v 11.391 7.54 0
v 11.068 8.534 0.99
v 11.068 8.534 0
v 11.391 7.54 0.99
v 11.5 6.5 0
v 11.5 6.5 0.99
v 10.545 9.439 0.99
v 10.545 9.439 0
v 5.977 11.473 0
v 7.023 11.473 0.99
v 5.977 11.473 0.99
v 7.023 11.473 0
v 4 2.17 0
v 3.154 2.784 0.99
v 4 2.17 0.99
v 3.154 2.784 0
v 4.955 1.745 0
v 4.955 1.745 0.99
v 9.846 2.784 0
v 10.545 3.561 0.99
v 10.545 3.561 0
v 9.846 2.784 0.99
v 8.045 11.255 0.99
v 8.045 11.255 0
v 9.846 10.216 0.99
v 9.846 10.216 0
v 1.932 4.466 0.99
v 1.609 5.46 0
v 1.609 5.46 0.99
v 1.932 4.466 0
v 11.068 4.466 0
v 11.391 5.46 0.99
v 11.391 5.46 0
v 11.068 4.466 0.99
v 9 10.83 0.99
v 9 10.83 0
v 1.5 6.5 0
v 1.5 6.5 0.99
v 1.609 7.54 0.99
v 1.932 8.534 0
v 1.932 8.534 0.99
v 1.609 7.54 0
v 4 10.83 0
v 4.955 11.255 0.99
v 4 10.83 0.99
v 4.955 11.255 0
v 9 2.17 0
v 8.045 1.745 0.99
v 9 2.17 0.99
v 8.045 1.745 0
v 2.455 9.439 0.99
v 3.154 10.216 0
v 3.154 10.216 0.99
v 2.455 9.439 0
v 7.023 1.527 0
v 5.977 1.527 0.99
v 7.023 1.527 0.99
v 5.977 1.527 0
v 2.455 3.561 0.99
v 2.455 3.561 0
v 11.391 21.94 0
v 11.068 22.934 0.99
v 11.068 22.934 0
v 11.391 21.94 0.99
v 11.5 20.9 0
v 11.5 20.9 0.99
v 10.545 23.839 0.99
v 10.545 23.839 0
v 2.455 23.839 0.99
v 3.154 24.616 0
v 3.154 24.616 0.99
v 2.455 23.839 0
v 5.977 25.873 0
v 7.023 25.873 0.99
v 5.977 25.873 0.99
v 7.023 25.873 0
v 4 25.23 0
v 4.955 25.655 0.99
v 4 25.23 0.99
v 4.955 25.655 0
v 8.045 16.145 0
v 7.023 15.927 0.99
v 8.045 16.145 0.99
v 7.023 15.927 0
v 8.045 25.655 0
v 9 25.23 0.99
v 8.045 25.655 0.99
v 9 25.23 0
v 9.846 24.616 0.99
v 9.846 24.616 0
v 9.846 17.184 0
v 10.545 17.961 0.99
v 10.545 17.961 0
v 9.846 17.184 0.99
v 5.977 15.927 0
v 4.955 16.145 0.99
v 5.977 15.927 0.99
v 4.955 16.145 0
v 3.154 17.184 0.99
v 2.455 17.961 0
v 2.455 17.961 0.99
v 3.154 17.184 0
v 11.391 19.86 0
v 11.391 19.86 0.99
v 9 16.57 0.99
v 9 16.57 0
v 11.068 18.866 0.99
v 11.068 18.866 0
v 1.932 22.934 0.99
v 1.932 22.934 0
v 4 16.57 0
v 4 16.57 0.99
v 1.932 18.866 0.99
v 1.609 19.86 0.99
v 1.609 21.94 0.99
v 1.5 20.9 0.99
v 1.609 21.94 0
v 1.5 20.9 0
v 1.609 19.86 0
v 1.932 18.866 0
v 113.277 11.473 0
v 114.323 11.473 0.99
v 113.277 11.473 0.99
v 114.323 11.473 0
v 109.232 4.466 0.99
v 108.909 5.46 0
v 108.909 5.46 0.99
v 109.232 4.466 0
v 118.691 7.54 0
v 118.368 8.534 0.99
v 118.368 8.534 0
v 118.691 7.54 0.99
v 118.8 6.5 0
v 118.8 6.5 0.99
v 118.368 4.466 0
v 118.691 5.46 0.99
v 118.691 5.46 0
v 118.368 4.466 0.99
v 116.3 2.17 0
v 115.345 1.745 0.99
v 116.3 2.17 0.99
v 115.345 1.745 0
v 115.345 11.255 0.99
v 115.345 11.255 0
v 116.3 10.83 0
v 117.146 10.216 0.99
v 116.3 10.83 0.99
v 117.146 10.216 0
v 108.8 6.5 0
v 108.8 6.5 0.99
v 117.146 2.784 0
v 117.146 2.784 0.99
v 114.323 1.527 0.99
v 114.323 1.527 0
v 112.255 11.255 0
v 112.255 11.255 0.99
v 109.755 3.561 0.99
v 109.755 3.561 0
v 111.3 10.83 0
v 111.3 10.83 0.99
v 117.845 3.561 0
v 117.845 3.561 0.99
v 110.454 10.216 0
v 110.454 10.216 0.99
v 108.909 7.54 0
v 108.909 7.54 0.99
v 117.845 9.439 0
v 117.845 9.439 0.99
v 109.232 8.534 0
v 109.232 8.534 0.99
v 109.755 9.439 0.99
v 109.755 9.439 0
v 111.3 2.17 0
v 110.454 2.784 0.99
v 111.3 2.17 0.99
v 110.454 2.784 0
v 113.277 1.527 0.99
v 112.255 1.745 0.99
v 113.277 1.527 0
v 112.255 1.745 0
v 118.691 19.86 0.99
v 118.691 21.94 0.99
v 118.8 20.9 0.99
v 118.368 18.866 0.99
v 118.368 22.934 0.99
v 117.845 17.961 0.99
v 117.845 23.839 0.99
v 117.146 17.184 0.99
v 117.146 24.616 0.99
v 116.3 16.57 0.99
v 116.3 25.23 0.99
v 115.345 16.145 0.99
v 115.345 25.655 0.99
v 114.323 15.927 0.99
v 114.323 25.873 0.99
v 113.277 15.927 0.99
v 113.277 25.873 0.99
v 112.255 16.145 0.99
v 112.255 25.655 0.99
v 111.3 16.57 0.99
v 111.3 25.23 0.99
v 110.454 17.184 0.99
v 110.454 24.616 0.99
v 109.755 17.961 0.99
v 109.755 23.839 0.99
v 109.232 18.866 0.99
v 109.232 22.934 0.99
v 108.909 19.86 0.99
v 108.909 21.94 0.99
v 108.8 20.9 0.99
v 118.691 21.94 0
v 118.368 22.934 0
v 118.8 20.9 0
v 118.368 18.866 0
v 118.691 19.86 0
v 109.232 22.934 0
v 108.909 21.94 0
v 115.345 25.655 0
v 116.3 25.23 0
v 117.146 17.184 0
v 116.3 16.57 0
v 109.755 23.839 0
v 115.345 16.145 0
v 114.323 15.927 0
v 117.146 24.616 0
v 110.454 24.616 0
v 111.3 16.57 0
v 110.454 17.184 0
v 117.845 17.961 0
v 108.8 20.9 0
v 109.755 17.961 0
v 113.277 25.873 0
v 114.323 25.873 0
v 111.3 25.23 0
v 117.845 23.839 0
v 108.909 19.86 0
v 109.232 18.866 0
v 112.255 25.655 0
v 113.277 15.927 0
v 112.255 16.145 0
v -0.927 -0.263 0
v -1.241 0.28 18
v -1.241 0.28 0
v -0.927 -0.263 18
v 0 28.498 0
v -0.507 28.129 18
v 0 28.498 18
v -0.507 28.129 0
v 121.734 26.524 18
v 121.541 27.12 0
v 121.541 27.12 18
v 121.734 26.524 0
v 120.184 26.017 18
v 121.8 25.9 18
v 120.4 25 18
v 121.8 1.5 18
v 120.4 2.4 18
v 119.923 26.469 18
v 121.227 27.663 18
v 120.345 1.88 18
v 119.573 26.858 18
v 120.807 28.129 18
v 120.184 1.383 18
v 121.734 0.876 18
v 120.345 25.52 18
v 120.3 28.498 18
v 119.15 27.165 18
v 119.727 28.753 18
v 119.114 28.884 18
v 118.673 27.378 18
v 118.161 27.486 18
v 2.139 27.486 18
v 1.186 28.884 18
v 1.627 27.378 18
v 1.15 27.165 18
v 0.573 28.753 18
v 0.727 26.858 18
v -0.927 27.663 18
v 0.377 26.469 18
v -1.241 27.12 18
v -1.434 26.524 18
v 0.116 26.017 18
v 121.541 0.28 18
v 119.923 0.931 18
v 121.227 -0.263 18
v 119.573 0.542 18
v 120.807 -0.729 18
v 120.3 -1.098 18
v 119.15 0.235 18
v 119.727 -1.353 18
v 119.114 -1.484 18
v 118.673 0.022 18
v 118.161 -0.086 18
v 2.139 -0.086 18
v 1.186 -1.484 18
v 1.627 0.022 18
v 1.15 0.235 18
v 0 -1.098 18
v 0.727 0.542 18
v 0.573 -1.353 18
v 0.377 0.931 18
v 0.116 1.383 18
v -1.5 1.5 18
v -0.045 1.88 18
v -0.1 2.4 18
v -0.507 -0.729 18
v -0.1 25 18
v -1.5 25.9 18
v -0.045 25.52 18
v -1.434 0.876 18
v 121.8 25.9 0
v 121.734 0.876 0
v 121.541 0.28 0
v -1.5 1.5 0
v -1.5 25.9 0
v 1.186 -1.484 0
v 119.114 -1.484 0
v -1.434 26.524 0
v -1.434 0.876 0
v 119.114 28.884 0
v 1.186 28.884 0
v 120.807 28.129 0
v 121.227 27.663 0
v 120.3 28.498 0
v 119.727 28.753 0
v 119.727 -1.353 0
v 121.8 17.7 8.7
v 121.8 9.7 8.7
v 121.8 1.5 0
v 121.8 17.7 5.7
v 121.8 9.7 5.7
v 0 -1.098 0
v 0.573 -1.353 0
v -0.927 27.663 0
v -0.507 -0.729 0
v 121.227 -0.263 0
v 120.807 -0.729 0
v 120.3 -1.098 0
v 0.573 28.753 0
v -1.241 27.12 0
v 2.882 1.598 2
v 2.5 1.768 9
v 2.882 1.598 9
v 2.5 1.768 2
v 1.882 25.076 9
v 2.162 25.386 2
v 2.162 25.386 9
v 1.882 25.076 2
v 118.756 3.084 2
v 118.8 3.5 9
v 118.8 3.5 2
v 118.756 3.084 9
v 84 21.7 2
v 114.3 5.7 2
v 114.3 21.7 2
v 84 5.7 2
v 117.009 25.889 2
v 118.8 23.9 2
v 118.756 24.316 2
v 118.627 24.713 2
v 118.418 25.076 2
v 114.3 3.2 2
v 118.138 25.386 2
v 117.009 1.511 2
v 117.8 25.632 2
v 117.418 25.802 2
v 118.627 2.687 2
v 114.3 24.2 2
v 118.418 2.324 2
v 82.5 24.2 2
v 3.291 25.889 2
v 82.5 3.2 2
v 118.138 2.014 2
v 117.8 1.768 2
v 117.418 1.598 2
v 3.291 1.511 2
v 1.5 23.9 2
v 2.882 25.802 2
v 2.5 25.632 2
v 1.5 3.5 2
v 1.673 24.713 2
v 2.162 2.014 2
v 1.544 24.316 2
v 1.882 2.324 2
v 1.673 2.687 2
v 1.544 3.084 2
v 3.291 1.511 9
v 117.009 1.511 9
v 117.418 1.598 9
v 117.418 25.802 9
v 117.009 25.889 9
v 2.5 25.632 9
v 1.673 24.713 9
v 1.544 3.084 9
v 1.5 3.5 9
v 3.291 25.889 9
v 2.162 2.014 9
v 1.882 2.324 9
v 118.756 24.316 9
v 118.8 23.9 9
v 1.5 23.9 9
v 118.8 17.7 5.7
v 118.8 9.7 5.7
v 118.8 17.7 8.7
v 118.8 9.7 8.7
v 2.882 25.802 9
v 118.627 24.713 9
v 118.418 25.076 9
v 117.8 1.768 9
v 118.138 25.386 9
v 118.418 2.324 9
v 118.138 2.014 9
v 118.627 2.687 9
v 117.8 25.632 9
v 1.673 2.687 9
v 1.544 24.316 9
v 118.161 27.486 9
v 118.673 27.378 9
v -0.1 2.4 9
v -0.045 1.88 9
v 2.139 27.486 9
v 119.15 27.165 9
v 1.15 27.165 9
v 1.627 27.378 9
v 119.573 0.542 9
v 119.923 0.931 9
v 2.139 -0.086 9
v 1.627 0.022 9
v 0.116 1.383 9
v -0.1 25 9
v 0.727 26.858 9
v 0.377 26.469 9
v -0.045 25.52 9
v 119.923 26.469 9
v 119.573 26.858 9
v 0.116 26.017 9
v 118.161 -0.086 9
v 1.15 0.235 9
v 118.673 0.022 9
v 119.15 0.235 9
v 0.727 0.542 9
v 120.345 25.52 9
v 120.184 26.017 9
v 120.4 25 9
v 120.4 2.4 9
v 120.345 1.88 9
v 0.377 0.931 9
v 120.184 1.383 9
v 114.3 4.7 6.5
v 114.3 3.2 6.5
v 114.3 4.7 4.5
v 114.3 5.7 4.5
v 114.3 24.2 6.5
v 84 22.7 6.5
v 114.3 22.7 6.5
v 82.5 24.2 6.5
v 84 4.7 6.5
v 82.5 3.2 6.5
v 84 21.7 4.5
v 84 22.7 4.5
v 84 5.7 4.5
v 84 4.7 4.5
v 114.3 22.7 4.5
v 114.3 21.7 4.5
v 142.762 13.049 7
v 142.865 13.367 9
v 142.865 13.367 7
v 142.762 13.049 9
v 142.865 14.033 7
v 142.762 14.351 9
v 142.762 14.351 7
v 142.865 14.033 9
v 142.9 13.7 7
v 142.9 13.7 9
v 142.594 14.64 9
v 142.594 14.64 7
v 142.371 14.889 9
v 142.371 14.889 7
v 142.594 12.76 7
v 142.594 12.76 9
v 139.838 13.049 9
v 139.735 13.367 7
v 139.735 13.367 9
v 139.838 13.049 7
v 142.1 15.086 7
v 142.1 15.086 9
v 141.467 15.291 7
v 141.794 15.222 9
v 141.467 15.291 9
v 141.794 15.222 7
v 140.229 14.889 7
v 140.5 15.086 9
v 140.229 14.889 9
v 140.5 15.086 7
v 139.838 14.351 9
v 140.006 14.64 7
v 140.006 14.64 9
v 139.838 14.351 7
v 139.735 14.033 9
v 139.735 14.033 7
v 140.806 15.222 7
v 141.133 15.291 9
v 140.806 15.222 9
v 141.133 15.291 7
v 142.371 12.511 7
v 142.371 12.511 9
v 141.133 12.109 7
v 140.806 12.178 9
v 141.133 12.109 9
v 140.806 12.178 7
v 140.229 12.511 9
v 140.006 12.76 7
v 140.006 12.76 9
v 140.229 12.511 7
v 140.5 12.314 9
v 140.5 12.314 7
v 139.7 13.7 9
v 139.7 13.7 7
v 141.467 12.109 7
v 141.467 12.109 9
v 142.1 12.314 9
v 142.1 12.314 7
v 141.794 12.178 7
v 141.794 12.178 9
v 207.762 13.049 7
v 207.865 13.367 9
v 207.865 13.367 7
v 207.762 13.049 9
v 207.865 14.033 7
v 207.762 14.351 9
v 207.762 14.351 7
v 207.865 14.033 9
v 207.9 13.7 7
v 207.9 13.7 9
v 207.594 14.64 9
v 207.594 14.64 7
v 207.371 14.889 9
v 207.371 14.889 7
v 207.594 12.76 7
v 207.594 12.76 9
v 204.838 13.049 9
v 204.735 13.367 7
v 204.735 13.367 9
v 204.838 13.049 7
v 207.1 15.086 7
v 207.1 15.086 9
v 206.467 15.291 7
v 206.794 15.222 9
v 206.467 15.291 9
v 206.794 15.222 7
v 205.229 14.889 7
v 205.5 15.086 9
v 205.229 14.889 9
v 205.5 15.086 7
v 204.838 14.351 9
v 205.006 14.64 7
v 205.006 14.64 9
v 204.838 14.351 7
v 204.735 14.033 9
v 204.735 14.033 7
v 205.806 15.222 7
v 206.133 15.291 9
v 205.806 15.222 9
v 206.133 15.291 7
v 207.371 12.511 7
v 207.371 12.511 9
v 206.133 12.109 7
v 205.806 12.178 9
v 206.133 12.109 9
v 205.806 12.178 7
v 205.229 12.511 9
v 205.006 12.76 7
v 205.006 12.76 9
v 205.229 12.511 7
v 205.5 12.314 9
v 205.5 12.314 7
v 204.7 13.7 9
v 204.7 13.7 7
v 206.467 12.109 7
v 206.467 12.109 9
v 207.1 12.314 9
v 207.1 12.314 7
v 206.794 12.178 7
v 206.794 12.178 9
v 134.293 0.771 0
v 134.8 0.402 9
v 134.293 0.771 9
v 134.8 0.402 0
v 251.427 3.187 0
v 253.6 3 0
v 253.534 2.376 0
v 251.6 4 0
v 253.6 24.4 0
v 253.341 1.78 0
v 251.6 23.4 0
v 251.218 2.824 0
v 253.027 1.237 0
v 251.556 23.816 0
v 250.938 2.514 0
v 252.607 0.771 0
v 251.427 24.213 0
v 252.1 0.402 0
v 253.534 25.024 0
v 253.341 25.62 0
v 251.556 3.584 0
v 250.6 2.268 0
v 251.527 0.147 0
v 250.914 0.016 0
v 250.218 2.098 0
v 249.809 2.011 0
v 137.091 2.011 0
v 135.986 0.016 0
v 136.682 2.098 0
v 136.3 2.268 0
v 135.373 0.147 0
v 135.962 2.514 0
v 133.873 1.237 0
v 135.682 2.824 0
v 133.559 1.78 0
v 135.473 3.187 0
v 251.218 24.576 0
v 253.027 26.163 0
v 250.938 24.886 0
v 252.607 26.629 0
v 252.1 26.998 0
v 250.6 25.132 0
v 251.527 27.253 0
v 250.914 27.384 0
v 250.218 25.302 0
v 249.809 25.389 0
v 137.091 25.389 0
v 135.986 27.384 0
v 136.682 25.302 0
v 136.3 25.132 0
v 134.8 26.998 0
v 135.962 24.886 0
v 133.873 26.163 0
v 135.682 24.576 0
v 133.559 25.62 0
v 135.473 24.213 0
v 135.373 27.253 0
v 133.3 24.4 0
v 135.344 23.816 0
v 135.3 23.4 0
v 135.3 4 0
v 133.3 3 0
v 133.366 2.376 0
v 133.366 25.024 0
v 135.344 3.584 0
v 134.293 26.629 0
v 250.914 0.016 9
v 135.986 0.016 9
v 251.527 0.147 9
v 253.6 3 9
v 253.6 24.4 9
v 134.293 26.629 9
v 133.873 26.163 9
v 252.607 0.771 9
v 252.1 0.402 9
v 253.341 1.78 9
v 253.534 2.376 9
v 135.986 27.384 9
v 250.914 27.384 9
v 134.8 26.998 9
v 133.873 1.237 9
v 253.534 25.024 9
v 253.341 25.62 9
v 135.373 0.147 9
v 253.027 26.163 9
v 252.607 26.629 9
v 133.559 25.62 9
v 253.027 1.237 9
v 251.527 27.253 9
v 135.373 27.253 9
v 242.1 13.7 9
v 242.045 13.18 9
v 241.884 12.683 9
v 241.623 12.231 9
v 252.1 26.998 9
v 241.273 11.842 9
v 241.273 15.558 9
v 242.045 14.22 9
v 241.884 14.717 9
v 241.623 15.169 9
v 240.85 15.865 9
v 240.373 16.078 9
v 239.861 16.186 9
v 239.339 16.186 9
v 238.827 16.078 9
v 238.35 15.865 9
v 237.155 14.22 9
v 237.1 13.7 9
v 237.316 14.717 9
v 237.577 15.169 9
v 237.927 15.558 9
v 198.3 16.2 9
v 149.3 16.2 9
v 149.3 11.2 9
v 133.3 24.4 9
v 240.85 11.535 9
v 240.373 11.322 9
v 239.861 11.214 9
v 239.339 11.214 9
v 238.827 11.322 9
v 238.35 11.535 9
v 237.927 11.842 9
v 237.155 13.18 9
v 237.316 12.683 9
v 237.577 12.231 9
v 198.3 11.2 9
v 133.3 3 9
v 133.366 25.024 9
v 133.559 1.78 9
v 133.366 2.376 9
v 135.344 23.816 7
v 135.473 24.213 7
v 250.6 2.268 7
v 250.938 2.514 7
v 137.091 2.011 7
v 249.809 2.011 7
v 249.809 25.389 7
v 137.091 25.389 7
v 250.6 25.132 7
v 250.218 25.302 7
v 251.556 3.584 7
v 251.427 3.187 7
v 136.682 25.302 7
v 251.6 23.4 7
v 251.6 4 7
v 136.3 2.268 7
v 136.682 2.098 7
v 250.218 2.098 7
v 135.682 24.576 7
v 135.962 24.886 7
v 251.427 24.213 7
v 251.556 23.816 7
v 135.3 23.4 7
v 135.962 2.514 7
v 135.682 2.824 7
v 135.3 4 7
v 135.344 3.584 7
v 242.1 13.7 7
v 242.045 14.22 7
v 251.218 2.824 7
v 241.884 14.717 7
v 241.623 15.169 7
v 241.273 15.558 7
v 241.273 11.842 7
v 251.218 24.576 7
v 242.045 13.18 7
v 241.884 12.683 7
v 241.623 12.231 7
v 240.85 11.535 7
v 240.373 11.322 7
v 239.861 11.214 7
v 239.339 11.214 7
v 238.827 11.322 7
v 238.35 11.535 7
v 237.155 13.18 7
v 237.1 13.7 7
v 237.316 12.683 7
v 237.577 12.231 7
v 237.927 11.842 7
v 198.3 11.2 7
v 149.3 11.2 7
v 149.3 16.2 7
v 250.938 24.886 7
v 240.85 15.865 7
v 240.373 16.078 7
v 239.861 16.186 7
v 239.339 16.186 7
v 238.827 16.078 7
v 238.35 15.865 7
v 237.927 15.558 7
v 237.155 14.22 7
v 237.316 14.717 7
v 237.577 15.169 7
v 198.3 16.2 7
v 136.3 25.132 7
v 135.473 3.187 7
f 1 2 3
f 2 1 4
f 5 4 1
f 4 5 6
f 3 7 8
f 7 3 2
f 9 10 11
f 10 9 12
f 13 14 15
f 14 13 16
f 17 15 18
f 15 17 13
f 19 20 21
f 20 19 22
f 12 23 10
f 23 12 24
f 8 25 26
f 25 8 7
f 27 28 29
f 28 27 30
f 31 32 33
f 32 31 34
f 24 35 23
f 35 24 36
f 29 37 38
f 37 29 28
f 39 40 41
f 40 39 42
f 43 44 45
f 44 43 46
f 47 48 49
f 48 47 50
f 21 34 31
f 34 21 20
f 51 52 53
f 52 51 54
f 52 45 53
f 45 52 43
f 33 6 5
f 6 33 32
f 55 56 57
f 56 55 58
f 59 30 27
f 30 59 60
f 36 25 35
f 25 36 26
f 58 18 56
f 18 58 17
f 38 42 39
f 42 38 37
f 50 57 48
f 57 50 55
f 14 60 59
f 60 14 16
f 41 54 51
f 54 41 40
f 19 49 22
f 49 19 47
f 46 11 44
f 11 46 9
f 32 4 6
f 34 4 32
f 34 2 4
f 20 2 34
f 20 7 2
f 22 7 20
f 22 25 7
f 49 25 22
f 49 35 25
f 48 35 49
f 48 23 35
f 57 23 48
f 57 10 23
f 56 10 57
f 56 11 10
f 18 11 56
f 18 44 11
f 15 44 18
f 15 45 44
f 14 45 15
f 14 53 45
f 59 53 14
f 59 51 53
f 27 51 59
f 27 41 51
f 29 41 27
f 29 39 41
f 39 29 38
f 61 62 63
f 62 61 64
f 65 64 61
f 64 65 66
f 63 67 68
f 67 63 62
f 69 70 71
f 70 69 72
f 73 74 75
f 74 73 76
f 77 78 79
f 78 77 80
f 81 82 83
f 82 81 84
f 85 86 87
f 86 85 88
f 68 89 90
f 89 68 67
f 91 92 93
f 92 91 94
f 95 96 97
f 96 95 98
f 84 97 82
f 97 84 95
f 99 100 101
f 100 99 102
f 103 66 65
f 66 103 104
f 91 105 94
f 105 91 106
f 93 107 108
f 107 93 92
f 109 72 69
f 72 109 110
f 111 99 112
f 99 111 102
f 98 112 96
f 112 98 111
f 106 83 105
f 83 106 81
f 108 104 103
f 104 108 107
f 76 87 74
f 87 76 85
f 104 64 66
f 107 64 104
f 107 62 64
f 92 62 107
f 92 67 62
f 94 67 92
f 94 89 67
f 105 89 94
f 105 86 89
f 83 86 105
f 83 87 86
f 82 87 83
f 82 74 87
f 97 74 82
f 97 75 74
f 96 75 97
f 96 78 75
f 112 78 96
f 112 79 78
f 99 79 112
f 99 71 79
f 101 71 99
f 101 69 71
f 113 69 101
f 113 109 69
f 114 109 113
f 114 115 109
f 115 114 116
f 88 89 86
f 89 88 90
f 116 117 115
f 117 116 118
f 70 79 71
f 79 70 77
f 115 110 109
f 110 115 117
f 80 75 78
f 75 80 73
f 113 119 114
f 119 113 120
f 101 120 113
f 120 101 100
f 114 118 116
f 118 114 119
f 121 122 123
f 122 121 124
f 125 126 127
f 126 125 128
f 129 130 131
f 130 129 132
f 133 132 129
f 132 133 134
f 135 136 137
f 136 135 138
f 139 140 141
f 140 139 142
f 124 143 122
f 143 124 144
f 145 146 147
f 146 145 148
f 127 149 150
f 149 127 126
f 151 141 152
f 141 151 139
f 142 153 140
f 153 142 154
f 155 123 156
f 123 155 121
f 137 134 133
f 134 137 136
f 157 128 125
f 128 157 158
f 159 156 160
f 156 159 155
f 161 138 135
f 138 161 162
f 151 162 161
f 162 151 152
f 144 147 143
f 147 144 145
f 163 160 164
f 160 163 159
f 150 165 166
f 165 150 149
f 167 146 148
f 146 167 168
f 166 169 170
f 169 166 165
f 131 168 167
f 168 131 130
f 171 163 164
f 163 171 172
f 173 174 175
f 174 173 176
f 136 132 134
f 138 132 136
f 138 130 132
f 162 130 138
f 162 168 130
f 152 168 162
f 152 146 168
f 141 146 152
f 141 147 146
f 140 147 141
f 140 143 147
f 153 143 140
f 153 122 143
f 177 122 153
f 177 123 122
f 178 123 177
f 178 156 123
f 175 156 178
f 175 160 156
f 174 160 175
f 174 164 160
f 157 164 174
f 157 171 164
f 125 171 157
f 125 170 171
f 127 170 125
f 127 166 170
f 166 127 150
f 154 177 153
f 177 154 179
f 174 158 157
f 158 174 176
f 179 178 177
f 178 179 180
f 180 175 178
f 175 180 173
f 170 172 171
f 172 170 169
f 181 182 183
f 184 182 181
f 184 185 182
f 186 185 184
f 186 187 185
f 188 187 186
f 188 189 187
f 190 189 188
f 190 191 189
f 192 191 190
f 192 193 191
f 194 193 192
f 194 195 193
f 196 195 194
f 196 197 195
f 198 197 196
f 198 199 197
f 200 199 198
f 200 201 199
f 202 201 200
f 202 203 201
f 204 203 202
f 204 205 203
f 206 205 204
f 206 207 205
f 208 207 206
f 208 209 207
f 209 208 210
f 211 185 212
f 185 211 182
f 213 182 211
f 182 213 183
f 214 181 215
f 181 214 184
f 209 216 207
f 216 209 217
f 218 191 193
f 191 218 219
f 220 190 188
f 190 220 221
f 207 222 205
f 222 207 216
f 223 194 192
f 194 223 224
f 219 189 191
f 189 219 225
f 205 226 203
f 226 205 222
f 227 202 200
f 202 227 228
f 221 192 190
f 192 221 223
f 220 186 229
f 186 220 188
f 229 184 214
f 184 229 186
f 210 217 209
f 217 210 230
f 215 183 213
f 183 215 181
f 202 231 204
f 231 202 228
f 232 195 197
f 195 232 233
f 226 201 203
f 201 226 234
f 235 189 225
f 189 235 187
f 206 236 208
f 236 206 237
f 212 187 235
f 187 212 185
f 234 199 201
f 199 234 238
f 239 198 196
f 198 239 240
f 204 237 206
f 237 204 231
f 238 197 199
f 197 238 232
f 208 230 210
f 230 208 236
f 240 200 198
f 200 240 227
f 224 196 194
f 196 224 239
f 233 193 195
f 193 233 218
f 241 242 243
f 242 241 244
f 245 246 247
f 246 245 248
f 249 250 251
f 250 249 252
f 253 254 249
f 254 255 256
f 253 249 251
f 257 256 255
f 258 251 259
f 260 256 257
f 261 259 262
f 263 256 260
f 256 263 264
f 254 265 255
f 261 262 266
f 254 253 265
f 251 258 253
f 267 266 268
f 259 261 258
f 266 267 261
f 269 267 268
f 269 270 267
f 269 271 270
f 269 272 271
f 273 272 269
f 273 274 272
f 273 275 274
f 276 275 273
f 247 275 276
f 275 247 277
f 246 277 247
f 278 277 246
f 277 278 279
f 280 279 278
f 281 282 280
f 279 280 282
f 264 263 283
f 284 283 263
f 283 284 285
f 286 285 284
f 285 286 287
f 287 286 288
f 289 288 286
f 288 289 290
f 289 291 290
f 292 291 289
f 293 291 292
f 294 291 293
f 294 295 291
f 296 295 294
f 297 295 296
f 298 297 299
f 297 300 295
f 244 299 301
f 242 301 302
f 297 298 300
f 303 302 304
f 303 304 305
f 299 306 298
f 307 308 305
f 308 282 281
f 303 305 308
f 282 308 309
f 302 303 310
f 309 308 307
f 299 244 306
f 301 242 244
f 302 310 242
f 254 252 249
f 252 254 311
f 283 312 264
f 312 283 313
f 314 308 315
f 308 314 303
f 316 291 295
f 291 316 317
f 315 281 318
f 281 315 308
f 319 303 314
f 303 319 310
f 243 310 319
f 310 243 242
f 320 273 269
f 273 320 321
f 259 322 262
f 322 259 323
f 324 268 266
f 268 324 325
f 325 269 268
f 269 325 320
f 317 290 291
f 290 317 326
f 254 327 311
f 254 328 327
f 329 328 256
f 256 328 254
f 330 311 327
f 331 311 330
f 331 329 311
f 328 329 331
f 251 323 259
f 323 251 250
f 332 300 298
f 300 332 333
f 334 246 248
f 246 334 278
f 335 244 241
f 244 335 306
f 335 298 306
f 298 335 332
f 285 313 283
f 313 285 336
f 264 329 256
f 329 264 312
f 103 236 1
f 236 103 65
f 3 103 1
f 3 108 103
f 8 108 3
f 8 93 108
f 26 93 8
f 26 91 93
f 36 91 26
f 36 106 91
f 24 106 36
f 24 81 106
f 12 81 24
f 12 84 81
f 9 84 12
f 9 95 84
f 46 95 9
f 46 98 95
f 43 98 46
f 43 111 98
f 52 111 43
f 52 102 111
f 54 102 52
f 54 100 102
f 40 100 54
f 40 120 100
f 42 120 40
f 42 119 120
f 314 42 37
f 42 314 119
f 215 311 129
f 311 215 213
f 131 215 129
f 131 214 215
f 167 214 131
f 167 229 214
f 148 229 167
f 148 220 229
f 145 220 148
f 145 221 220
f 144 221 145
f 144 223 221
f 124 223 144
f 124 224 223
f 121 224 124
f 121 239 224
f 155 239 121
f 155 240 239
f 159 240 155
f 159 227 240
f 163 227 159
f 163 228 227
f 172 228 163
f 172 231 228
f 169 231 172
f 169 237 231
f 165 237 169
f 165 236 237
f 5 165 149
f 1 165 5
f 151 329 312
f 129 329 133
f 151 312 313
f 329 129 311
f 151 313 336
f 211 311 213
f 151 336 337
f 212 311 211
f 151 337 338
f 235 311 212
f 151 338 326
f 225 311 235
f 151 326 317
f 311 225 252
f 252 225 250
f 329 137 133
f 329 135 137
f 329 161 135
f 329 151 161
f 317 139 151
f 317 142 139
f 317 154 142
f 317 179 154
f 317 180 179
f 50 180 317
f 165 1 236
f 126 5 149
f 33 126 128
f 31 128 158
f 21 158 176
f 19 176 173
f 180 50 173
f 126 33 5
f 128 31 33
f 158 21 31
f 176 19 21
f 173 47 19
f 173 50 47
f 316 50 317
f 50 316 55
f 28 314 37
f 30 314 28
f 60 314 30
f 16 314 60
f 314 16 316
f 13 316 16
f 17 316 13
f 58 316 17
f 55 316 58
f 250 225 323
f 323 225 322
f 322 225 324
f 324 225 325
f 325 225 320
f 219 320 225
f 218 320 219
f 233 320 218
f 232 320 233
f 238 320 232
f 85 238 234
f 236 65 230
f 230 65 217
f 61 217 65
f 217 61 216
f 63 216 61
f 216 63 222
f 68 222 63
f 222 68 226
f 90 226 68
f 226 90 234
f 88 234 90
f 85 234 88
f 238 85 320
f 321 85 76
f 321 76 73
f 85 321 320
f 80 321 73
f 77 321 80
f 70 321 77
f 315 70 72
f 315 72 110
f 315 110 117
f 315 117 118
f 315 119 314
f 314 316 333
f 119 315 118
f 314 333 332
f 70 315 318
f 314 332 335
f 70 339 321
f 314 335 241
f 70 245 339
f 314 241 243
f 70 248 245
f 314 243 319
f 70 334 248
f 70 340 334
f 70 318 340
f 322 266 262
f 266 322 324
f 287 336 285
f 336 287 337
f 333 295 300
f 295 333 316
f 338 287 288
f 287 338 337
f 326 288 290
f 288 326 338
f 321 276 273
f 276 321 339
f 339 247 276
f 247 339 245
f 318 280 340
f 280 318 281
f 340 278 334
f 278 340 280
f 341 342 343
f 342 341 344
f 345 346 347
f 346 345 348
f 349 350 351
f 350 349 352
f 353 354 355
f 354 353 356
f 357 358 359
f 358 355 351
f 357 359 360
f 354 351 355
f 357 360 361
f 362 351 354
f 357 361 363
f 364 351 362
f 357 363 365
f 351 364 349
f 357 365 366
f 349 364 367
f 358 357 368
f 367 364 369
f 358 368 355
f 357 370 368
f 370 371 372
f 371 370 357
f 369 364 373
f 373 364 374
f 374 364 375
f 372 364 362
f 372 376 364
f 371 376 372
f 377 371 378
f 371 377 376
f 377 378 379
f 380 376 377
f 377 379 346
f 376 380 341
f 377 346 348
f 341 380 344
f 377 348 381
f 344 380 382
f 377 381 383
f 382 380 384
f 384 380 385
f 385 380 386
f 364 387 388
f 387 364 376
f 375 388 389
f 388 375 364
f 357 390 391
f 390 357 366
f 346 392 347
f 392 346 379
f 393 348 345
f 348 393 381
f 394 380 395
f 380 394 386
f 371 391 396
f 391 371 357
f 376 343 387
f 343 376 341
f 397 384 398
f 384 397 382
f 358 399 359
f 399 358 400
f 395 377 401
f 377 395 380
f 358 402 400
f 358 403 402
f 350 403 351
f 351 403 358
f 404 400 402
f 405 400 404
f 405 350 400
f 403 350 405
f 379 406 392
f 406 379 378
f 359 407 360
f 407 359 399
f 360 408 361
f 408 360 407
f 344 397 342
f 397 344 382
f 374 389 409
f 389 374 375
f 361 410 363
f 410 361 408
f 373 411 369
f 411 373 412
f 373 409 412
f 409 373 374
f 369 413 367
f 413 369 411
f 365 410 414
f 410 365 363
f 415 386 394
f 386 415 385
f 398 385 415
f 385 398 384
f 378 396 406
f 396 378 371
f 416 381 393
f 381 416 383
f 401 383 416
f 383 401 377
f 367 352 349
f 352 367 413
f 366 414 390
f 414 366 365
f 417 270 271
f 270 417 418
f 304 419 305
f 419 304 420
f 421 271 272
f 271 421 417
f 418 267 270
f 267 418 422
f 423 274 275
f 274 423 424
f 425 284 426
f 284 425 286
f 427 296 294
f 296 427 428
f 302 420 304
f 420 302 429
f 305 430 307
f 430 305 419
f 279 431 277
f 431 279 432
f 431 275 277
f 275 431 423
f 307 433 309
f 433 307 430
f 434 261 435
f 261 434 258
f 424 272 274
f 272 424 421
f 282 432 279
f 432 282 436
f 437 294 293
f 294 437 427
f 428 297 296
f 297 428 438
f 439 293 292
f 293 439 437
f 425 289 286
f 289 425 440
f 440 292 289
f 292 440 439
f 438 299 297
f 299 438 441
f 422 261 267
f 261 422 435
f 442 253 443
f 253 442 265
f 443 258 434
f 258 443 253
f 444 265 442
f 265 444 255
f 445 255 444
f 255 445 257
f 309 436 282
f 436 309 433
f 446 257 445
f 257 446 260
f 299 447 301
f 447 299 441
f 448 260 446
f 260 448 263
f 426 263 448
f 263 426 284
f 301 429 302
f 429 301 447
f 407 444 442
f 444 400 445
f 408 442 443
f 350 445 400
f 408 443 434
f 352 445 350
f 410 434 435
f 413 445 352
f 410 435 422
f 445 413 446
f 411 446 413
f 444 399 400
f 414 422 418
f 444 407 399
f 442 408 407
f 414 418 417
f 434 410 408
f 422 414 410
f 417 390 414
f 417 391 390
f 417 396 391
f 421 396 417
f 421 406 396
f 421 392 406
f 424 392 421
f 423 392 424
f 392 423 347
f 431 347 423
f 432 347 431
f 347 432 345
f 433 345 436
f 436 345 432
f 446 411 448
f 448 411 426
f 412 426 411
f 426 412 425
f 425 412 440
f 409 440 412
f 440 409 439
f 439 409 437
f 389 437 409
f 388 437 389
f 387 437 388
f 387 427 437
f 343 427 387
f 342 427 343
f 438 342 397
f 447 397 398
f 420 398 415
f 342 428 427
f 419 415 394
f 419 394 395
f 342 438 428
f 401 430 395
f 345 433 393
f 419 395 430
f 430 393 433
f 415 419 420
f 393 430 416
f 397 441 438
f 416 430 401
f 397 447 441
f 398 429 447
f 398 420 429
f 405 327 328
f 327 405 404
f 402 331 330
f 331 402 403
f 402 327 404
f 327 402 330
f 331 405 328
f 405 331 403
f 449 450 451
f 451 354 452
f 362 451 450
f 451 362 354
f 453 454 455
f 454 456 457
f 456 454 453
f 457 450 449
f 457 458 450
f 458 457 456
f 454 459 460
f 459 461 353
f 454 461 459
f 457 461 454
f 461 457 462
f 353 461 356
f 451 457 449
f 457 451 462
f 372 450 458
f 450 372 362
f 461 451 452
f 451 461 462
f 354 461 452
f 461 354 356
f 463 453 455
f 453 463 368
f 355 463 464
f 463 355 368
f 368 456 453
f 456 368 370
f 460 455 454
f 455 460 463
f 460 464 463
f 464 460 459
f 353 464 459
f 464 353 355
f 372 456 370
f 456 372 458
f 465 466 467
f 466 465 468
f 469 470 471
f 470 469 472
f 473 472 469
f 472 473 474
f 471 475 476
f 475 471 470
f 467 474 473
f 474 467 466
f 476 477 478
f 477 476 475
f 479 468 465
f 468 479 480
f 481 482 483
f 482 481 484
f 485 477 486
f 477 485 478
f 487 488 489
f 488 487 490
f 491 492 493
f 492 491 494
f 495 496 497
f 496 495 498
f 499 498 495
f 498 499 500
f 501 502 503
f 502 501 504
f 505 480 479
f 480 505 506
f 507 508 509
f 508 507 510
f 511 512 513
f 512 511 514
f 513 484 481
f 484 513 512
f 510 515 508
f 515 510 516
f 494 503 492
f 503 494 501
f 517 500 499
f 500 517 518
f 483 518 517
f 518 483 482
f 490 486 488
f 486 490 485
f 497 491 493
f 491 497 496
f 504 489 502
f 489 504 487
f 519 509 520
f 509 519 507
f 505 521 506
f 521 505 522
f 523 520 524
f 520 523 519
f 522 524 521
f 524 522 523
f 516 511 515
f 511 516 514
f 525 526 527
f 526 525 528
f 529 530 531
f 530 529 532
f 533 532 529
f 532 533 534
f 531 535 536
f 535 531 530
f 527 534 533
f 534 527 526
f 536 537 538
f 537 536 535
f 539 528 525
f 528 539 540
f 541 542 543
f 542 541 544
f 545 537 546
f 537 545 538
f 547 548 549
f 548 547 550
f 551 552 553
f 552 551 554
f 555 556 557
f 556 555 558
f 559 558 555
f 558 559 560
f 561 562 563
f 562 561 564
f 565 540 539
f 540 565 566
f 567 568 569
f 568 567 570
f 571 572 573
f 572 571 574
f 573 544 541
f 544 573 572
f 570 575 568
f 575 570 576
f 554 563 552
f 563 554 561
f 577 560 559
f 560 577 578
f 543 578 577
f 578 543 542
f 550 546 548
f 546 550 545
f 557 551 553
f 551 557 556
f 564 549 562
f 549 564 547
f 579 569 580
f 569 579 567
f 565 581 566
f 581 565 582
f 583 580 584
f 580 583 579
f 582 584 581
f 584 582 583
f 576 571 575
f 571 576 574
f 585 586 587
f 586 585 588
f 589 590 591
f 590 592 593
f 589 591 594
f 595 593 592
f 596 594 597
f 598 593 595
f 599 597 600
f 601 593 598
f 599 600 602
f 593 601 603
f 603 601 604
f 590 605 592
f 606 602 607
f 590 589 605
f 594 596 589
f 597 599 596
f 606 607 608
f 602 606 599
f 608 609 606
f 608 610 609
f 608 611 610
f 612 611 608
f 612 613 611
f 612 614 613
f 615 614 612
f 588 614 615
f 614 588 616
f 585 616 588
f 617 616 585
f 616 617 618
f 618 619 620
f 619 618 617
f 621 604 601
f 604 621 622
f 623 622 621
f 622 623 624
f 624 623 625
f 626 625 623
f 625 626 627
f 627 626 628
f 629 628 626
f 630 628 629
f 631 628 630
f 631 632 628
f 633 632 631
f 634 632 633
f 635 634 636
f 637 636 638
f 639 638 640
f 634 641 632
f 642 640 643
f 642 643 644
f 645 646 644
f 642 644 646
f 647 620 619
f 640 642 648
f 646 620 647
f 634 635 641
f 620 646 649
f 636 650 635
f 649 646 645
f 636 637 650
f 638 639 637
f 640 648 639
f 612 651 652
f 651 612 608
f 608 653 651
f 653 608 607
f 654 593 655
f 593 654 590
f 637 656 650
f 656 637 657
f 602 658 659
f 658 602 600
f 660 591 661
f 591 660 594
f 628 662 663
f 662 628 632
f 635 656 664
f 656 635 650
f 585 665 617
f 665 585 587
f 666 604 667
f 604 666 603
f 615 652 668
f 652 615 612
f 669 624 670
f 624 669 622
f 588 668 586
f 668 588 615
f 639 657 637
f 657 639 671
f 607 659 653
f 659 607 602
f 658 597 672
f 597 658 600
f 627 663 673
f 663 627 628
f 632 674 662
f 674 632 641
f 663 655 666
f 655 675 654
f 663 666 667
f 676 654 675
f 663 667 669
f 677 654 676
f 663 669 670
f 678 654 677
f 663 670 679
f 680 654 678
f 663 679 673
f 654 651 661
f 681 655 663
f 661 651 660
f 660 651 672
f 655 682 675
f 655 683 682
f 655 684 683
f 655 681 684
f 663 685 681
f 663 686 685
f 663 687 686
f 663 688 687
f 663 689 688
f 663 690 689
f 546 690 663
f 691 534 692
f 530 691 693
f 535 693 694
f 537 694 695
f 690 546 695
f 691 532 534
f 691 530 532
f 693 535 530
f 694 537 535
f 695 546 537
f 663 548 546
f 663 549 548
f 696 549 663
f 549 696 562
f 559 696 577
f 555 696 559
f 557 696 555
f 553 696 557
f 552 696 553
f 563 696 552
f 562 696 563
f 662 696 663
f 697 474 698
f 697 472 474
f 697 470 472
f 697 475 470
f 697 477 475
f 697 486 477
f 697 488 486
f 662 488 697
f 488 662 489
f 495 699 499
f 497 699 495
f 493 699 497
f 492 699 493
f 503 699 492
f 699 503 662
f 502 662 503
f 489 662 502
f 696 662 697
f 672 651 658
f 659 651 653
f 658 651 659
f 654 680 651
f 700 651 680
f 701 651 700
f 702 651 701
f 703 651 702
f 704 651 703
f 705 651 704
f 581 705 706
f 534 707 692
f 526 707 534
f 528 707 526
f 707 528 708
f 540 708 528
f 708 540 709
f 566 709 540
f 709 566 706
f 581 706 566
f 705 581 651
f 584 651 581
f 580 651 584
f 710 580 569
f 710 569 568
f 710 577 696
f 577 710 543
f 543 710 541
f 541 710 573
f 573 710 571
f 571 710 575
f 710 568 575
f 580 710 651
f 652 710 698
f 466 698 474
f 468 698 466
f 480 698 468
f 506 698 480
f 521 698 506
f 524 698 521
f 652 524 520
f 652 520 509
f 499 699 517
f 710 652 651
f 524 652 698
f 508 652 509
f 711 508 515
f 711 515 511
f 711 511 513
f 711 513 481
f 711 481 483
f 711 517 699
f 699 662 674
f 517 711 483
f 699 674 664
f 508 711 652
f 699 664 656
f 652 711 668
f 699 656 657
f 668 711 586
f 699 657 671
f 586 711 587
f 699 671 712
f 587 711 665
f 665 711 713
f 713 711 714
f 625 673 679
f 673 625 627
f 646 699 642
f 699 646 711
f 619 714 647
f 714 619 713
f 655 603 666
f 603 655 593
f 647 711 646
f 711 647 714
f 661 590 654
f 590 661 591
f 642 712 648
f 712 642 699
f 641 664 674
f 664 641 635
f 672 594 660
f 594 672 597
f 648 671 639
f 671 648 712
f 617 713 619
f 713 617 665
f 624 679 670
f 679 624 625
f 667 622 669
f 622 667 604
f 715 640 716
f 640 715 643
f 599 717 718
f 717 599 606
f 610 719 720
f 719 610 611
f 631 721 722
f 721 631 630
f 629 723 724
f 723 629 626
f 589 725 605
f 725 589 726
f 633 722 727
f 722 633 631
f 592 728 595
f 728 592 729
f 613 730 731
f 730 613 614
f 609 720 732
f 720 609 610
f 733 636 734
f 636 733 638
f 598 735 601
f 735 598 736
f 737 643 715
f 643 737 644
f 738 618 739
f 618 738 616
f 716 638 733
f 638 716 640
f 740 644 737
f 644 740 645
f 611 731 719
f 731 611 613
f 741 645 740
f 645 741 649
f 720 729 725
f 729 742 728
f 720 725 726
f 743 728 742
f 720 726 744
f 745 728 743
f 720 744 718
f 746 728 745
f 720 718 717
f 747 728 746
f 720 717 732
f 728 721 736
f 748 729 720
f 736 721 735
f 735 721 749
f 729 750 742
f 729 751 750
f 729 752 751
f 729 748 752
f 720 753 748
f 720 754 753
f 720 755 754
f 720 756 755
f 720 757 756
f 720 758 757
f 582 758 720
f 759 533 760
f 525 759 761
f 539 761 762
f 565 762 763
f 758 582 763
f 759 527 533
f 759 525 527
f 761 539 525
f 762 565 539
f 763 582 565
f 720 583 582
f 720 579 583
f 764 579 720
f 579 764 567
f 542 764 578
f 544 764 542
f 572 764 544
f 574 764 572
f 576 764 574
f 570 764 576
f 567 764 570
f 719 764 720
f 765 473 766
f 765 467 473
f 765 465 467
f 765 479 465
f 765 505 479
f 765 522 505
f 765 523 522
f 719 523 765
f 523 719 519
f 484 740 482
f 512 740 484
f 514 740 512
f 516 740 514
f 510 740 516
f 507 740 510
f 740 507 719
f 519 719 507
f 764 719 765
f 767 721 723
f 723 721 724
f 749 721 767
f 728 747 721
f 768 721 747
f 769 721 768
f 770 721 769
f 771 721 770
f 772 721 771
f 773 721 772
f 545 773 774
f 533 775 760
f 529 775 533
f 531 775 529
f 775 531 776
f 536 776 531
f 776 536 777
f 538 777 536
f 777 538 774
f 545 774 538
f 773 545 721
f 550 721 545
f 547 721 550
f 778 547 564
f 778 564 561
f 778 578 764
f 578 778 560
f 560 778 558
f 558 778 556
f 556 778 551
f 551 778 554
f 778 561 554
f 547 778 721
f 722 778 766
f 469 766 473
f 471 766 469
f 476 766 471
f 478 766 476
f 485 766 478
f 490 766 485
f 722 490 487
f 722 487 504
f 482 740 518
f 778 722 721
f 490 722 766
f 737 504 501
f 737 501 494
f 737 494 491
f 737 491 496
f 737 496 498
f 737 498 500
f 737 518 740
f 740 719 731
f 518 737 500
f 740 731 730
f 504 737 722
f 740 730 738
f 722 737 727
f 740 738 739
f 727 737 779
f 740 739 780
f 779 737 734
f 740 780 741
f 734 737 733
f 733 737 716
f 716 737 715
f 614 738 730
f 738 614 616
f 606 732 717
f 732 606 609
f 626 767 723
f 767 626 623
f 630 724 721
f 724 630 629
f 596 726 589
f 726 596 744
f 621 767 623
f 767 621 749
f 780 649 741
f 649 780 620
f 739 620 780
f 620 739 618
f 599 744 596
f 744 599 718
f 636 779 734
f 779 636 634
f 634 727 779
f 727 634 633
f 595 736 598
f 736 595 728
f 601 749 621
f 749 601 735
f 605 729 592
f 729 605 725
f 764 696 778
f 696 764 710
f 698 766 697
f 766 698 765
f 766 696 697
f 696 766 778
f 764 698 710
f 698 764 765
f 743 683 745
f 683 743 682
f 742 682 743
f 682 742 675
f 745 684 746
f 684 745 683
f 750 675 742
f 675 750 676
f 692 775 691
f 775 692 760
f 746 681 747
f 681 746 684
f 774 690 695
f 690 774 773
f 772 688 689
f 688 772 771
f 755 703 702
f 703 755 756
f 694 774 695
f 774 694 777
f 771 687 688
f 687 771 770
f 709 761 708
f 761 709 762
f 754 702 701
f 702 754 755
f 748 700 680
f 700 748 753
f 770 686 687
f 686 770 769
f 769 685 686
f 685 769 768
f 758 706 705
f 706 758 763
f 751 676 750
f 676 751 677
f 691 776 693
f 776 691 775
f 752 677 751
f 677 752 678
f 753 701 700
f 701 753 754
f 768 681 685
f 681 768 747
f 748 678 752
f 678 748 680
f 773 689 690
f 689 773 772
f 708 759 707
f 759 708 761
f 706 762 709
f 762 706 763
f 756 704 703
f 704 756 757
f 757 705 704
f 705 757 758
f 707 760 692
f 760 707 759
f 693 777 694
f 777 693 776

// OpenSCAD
// USB MIDI Crossfader — Enclosure
// Two-piece snap-fit case for Mini Innofader Plus + Teensy 4.0
// Print both pieces flat (no supports needed).
//
// Units: mm

// --- Dimensions (adjust to match your specific Innofader Plus) ---
fader_slot_length = 49;       // fader knob travel opening
fader_slot_width  = 5;        // width of the slot for the knob
fader_mount_spacing = 65;     // screw hole center-to-center (~1.5")
fader_mount_hole_dia = 3.2;   // M3 screw clearance
fader_body_length = 73;       // fader PCB length (along travel axis)
fader_body_width  = 16;       // fader PCB width

// Teensy 4.0 dimensions (without pins — soldering wires directly)
teensy_length = 36.3;
teensy_width  = 17.4;
teensy_height = 4;            // no pins, board + components only
usb_width     = 8;            // micro-USB port opening
usb_height    = 3.0;            // micro-USB port height

// Teensy cradle parameters
teensy_cradle_tolerance = 0.3;      // gap per side for friction fit
teensy_ledge_height = 2.5;          // height of ledge where PCB rests (SMD clearance below)
teensy_rail_total_height = 4.5;     // total rail height (extends above ledge to grip board)
teensy_rail_thickness = 1.5;        // outer rail wall thickness
teensy_ledge_width = 1.0;           // inward lip width that supports PCB edges
teensy_backstop_thickness = 1.5;    // end stop wall thickness

// Case parameters
wall = 2;
case_length = fader_body_length + teensy_length + wall * 3 + 5; // fader + gap + teensy
case_width  = max(fader_body_width, teensy_width) + wall * 2 + 6;
case_height = 18;             // raised for component clearance
corner_r    = 3;
fit_gap     = 3.0;            // base larger than top plate (1.5mm per side)
lid_clearance = 0.2;          // clearance around lid in rebate (0.1mm per side)
lower_wall = wall + 1.0;      // thicker walls below rebate to create wider ledge (3mm)

// Teensy area position (shared between base and top_plate)
teensy_area_start = wall + 2 + fader_body_length + wall + 5;

// LED hole (for WS2812B — light pipe or flush mount)
led_hole_dia = 5;

// Rubber foot recesses
foot_dia    = 10;
foot_depth  = 1;
foot_inset  = 8; // from corner

// --- Modules ---

module rounded_box(l, w, h, r) {
    hull() {
        for (x = [r, l-r])
            for (y = [r, w-r])
                translate([x, y, 0])
                    cylinder(h=h, r=r, $fn=30);
    }
}

// (snap-fit removed — lid friction-fits into rebate)

// --- Base (full-height box with rebate for lid) ---
module base() {
    off = fit_gap / 2;  // base extends this far beyond top plate on each side
    base_length = case_length + fit_gap;
    base_width  = case_width + fit_gap;

    difference() {
        // Outer shell — full case height
        translate([-off, -off, 0])
            rounded_box(base_length, base_width, case_height, corner_r);

        // Lower cavity (component area — thicker walls for ledge)
        translate([-off + lower_wall, -off + lower_wall, wall])
            rounded_box(base_length - lower_wall*2, base_width - lower_wall*2,
                        case_height, corner_r - 1);

        // Upper rebate (lid drops in here — thinner rim walls)
        translate([-lid_clearance/2, -lid_clearance/2, case_height / 2])
            rounded_box(case_length + lid_clearance, case_width + lid_clearance,
                        case_height, corner_r - 0.5);

        // USB port cutout (through base back wall — aligned to Teensy on ledge)
        usb_z = wall + teensy_ledge_height + 1.2;
        translate([case_length - wall - 1,
                   case_width/2 - usb_width/2,
                   usb_z])
            cube([wall + off + 2, usb_width, usb_height]);

        // Rubber foot recesses (bottom, centered on base)
        for (x = [foot_inset - off, base_length - foot_inset - off])
            for (y = [foot_inset - off, base_width - foot_inset - off])
                translate([x, y, -0.01])
                    cylinder(d=foot_dia, h=foot_depth, $fn=30);
    }

    // Teensy cradle — L-shaped rails with ledges, open underneath for SMDs
    teensy_cavity_width = teensy_width + teensy_cradle_tolerance * 2;
    teensy_center_y = case_width / 2;
    teensy_rail_y_left  = teensy_center_y - teensy_cavity_width / 2 - teensy_rail_thickness;
    teensy_rail_y_right = teensy_center_y + teensy_cavity_width / 2;
    teensy_rail_len = teensy_length - 6;  // shortened on USB end for clearance

    // Left rail wall (full height)
    translate([teensy_area_start, teensy_rail_y_left, wall])
        cube([teensy_rail_len, teensy_rail_thickness, teensy_rail_total_height]);

    // Left rail ledge (inward lip — PCB edge rests here)
    translate([teensy_area_start, teensy_rail_y_left + teensy_rail_thickness, wall])
        cube([teensy_rail_len, teensy_ledge_width, teensy_ledge_height]);

    // Right rail wall (full height)
    translate([teensy_area_start, teensy_rail_y_right, wall])
        cube([teensy_rail_len, teensy_rail_thickness, teensy_rail_total_height]);

    // Right rail ledge (inward lip — PCB edge rests here)
    translate([teensy_area_start, teensy_rail_y_right - teensy_ledge_width, wall])
        cube([teensy_rail_len, teensy_ledge_width, teensy_ledge_height]);

    // Backstop (non-USB end, prevents sliding toward fader)
    translate([teensy_area_start - teensy_backstop_thickness,
               teensy_rail_y_left,
               wall])
        cube([teensy_backstop_thickness,
              teensy_cavity_width + teensy_rail_thickness * 2,
              teensy_rail_total_height]);
}

// --- Top plate (lid — drops into base rebate) ---
module top_plate() {
    fader_area_start = wall + 2;

    difference() {
        // Lid outer shell
        rounded_box(case_length, case_width, case_height / 2, corner_r);

        // Hollow out underside (fader body hangs down into this cavity)
        translate([wall, wall, -0.01])
            rounded_box(case_length - wall*2, case_width - wall*2,
                        case_height / 2 - wall + 0.01, corner_r - 1);

        // Fader slot (knob travel)
        translate([fader_area_start + (fader_body_length - fader_slot_length) / 2,
                   case_width/2 - fader_slot_width/2,
                   -0.5])
            cube([fader_slot_length, fader_slot_width, case_height]);

        // Fader mounting holes (M3 clearance through 2mm ceiling)
        fader_center_x = fader_area_start + fader_body_length / 2;
        for (dx = [-fader_mount_spacing/2, fader_mount_spacing/2])
            translate([fader_center_x + dx, case_width/2, -0.5])
                cylinder(d=fader_mount_hole_dia, h=case_height, $fn=30);

        // LED hole (near the USB end)
        translate([case_length - wall - 12, case_width/2, -0.5])
            cylinder(d=led_hole_dia, h=case_height, $fn=30);
    }
}

// --- Render ---
// Base
base();

// Top plate / lid (offset for printing — move next to base)
translate([case_length + fit_gap + 10, 0, 0])
    top_plate();
